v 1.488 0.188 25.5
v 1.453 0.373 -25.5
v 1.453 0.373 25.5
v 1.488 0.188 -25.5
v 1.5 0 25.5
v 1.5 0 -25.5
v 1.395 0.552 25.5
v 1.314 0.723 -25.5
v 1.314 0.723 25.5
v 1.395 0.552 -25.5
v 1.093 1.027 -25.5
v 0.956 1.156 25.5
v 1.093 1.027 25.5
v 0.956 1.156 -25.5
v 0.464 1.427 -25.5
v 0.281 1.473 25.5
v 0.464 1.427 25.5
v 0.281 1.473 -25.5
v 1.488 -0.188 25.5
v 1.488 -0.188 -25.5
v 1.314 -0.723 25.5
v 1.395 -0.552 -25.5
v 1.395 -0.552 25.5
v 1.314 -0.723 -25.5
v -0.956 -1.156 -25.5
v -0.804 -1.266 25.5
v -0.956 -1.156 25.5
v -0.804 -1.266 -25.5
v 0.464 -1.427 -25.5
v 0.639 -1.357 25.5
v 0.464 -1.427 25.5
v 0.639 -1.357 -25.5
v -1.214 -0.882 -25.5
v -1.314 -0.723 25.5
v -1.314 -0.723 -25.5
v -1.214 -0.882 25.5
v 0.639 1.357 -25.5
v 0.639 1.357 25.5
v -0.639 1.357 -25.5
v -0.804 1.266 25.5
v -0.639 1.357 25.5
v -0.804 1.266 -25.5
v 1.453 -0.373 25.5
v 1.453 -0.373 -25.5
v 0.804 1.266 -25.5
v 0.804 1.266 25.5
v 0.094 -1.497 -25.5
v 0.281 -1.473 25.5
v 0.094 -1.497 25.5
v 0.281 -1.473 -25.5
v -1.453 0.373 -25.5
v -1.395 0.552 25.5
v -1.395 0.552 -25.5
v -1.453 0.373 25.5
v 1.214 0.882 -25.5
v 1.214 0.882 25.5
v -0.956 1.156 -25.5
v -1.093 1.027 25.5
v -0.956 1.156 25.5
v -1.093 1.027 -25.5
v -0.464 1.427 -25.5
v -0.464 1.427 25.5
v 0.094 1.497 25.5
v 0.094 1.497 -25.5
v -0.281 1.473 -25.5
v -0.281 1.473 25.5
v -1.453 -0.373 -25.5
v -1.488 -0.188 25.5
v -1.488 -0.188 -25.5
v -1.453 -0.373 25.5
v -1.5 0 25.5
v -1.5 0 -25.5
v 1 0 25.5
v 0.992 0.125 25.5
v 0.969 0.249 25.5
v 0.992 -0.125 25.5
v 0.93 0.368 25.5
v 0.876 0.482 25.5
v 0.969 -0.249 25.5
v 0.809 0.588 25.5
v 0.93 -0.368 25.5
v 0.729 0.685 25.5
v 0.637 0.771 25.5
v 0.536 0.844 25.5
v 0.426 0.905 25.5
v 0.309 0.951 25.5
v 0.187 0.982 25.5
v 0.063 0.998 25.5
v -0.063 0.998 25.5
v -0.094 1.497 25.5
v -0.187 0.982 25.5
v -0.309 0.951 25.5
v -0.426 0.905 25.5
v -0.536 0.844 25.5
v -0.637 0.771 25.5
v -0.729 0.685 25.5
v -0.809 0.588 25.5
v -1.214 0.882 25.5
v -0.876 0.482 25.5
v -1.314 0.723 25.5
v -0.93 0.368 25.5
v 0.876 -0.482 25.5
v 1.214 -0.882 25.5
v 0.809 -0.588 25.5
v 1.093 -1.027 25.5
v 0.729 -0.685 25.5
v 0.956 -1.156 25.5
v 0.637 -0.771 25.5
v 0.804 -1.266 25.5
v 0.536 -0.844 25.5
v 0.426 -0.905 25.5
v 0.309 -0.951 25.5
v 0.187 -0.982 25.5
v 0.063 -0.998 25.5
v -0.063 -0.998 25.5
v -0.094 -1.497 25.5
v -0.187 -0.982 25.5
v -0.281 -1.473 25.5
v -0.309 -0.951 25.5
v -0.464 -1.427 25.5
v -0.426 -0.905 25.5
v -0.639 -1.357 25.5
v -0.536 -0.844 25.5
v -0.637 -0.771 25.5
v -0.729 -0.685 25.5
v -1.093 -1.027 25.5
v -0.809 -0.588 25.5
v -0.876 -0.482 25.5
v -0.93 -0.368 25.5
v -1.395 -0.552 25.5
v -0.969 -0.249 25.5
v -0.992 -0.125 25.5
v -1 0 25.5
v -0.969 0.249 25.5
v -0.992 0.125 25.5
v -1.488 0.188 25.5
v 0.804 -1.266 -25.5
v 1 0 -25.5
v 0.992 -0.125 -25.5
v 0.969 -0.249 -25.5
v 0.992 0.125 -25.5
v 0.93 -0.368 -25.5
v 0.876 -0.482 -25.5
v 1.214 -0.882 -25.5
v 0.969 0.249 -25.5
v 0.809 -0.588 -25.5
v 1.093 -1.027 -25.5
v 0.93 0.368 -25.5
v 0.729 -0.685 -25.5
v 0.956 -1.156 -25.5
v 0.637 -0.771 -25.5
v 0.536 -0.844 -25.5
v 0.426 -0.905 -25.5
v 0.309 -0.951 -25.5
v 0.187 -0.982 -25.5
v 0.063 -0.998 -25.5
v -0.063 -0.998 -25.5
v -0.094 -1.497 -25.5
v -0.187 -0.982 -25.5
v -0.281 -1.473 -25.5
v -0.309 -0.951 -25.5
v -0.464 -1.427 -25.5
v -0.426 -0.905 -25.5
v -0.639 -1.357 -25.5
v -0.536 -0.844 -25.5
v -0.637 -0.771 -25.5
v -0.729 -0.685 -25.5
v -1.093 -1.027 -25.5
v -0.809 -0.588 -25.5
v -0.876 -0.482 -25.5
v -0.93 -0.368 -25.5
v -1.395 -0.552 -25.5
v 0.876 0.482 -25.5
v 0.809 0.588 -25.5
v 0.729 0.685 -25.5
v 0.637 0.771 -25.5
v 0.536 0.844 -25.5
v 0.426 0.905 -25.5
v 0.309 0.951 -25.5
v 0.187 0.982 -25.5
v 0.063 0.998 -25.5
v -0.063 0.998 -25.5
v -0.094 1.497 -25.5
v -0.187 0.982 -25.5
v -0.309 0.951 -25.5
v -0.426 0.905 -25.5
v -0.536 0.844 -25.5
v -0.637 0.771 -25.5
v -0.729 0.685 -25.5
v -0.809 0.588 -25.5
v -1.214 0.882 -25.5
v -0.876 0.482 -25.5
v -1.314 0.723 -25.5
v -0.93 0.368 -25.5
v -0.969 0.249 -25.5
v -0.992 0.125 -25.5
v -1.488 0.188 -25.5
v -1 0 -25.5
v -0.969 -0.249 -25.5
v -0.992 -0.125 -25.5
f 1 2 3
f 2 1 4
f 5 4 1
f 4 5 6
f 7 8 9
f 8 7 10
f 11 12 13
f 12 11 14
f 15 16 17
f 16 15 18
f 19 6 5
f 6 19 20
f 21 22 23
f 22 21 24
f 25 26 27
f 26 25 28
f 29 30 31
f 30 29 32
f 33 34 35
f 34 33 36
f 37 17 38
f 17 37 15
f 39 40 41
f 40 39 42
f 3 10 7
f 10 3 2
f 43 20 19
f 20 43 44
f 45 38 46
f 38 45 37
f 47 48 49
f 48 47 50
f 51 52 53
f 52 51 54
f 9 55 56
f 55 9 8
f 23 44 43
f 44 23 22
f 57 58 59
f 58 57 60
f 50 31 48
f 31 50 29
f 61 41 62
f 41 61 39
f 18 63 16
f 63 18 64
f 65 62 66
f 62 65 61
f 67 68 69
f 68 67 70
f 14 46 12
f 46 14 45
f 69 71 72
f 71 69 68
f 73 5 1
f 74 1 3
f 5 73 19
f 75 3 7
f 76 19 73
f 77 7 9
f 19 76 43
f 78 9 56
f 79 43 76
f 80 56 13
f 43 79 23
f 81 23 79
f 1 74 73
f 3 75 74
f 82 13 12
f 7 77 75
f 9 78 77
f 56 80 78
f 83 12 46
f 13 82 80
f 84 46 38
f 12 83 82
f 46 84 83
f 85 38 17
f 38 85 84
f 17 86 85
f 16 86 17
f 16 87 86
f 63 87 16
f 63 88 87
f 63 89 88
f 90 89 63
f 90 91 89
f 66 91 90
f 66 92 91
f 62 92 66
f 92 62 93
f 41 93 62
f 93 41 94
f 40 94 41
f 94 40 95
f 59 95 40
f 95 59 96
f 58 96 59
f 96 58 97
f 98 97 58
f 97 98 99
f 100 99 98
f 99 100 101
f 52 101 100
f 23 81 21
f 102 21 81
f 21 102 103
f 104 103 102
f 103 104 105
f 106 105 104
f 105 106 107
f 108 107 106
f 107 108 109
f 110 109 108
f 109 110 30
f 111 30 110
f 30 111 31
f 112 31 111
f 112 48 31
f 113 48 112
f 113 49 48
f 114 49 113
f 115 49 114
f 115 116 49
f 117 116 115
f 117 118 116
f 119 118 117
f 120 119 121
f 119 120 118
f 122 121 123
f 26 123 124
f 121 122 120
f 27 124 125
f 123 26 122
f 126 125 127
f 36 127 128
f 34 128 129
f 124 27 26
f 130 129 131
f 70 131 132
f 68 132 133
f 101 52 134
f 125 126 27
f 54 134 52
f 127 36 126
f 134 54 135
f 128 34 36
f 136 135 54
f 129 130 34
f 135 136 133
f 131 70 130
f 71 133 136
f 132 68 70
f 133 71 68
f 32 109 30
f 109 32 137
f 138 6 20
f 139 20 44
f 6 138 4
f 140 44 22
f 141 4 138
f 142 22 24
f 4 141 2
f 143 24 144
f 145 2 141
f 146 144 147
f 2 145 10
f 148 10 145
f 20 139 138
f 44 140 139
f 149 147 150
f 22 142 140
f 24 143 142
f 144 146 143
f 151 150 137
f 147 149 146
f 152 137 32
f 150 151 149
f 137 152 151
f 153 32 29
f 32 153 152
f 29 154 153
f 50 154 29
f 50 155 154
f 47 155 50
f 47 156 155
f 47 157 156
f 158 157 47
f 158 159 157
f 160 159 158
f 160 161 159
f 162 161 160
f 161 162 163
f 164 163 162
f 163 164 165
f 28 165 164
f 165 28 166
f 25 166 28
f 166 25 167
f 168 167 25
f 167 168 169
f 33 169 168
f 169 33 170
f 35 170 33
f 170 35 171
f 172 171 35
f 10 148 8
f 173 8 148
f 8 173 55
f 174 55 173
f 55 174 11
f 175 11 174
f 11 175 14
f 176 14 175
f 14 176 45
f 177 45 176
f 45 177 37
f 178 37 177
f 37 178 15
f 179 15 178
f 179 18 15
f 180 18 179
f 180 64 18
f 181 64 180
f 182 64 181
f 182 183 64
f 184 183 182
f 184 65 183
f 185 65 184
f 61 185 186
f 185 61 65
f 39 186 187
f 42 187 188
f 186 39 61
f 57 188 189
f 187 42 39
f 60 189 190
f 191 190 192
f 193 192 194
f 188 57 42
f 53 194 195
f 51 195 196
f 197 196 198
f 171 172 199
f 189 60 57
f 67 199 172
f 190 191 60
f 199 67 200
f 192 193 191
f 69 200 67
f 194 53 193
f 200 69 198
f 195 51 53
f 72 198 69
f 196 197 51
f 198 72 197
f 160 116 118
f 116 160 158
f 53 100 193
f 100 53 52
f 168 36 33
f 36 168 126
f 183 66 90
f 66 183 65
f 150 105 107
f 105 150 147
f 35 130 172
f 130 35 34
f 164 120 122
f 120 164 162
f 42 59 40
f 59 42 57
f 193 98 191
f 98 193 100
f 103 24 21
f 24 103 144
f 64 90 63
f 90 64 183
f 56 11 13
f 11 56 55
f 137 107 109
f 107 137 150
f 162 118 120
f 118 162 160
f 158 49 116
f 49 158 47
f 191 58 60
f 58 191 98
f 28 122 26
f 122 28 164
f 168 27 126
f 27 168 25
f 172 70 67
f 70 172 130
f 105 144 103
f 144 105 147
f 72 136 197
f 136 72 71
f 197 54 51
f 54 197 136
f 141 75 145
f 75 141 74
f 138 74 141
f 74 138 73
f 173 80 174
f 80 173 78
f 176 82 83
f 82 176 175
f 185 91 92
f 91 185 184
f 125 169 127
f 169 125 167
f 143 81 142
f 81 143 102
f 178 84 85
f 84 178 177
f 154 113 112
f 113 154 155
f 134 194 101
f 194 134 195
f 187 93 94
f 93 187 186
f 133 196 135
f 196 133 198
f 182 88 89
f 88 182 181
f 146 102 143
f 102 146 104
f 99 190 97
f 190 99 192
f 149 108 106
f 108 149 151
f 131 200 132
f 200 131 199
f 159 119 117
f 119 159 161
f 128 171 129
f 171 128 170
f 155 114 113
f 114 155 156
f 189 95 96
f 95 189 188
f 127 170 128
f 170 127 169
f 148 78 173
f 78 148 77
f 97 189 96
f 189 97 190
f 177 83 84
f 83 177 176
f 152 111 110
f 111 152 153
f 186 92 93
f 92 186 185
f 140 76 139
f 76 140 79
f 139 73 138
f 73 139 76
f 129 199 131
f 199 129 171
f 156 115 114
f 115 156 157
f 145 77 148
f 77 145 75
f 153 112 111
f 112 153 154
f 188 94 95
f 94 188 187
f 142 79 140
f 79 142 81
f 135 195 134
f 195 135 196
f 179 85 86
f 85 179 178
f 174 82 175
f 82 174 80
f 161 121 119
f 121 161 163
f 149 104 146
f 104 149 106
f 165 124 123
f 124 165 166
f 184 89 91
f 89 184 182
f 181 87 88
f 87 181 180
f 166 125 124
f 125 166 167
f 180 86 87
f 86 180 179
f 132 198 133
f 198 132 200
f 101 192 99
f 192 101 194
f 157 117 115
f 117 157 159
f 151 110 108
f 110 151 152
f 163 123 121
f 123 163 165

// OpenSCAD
$fn = 50;


difference() {
	union() {
		translate(v = [0, 0, -25.5000000000]) {
			cylinder(h = 51, r = 1.5000000000);
		}
	}
	union() {
		translate(v = [0, 0, -100.0000000000]) {
			cylinder(h = 200, r = 1.0000000000);
		}
	}
}
